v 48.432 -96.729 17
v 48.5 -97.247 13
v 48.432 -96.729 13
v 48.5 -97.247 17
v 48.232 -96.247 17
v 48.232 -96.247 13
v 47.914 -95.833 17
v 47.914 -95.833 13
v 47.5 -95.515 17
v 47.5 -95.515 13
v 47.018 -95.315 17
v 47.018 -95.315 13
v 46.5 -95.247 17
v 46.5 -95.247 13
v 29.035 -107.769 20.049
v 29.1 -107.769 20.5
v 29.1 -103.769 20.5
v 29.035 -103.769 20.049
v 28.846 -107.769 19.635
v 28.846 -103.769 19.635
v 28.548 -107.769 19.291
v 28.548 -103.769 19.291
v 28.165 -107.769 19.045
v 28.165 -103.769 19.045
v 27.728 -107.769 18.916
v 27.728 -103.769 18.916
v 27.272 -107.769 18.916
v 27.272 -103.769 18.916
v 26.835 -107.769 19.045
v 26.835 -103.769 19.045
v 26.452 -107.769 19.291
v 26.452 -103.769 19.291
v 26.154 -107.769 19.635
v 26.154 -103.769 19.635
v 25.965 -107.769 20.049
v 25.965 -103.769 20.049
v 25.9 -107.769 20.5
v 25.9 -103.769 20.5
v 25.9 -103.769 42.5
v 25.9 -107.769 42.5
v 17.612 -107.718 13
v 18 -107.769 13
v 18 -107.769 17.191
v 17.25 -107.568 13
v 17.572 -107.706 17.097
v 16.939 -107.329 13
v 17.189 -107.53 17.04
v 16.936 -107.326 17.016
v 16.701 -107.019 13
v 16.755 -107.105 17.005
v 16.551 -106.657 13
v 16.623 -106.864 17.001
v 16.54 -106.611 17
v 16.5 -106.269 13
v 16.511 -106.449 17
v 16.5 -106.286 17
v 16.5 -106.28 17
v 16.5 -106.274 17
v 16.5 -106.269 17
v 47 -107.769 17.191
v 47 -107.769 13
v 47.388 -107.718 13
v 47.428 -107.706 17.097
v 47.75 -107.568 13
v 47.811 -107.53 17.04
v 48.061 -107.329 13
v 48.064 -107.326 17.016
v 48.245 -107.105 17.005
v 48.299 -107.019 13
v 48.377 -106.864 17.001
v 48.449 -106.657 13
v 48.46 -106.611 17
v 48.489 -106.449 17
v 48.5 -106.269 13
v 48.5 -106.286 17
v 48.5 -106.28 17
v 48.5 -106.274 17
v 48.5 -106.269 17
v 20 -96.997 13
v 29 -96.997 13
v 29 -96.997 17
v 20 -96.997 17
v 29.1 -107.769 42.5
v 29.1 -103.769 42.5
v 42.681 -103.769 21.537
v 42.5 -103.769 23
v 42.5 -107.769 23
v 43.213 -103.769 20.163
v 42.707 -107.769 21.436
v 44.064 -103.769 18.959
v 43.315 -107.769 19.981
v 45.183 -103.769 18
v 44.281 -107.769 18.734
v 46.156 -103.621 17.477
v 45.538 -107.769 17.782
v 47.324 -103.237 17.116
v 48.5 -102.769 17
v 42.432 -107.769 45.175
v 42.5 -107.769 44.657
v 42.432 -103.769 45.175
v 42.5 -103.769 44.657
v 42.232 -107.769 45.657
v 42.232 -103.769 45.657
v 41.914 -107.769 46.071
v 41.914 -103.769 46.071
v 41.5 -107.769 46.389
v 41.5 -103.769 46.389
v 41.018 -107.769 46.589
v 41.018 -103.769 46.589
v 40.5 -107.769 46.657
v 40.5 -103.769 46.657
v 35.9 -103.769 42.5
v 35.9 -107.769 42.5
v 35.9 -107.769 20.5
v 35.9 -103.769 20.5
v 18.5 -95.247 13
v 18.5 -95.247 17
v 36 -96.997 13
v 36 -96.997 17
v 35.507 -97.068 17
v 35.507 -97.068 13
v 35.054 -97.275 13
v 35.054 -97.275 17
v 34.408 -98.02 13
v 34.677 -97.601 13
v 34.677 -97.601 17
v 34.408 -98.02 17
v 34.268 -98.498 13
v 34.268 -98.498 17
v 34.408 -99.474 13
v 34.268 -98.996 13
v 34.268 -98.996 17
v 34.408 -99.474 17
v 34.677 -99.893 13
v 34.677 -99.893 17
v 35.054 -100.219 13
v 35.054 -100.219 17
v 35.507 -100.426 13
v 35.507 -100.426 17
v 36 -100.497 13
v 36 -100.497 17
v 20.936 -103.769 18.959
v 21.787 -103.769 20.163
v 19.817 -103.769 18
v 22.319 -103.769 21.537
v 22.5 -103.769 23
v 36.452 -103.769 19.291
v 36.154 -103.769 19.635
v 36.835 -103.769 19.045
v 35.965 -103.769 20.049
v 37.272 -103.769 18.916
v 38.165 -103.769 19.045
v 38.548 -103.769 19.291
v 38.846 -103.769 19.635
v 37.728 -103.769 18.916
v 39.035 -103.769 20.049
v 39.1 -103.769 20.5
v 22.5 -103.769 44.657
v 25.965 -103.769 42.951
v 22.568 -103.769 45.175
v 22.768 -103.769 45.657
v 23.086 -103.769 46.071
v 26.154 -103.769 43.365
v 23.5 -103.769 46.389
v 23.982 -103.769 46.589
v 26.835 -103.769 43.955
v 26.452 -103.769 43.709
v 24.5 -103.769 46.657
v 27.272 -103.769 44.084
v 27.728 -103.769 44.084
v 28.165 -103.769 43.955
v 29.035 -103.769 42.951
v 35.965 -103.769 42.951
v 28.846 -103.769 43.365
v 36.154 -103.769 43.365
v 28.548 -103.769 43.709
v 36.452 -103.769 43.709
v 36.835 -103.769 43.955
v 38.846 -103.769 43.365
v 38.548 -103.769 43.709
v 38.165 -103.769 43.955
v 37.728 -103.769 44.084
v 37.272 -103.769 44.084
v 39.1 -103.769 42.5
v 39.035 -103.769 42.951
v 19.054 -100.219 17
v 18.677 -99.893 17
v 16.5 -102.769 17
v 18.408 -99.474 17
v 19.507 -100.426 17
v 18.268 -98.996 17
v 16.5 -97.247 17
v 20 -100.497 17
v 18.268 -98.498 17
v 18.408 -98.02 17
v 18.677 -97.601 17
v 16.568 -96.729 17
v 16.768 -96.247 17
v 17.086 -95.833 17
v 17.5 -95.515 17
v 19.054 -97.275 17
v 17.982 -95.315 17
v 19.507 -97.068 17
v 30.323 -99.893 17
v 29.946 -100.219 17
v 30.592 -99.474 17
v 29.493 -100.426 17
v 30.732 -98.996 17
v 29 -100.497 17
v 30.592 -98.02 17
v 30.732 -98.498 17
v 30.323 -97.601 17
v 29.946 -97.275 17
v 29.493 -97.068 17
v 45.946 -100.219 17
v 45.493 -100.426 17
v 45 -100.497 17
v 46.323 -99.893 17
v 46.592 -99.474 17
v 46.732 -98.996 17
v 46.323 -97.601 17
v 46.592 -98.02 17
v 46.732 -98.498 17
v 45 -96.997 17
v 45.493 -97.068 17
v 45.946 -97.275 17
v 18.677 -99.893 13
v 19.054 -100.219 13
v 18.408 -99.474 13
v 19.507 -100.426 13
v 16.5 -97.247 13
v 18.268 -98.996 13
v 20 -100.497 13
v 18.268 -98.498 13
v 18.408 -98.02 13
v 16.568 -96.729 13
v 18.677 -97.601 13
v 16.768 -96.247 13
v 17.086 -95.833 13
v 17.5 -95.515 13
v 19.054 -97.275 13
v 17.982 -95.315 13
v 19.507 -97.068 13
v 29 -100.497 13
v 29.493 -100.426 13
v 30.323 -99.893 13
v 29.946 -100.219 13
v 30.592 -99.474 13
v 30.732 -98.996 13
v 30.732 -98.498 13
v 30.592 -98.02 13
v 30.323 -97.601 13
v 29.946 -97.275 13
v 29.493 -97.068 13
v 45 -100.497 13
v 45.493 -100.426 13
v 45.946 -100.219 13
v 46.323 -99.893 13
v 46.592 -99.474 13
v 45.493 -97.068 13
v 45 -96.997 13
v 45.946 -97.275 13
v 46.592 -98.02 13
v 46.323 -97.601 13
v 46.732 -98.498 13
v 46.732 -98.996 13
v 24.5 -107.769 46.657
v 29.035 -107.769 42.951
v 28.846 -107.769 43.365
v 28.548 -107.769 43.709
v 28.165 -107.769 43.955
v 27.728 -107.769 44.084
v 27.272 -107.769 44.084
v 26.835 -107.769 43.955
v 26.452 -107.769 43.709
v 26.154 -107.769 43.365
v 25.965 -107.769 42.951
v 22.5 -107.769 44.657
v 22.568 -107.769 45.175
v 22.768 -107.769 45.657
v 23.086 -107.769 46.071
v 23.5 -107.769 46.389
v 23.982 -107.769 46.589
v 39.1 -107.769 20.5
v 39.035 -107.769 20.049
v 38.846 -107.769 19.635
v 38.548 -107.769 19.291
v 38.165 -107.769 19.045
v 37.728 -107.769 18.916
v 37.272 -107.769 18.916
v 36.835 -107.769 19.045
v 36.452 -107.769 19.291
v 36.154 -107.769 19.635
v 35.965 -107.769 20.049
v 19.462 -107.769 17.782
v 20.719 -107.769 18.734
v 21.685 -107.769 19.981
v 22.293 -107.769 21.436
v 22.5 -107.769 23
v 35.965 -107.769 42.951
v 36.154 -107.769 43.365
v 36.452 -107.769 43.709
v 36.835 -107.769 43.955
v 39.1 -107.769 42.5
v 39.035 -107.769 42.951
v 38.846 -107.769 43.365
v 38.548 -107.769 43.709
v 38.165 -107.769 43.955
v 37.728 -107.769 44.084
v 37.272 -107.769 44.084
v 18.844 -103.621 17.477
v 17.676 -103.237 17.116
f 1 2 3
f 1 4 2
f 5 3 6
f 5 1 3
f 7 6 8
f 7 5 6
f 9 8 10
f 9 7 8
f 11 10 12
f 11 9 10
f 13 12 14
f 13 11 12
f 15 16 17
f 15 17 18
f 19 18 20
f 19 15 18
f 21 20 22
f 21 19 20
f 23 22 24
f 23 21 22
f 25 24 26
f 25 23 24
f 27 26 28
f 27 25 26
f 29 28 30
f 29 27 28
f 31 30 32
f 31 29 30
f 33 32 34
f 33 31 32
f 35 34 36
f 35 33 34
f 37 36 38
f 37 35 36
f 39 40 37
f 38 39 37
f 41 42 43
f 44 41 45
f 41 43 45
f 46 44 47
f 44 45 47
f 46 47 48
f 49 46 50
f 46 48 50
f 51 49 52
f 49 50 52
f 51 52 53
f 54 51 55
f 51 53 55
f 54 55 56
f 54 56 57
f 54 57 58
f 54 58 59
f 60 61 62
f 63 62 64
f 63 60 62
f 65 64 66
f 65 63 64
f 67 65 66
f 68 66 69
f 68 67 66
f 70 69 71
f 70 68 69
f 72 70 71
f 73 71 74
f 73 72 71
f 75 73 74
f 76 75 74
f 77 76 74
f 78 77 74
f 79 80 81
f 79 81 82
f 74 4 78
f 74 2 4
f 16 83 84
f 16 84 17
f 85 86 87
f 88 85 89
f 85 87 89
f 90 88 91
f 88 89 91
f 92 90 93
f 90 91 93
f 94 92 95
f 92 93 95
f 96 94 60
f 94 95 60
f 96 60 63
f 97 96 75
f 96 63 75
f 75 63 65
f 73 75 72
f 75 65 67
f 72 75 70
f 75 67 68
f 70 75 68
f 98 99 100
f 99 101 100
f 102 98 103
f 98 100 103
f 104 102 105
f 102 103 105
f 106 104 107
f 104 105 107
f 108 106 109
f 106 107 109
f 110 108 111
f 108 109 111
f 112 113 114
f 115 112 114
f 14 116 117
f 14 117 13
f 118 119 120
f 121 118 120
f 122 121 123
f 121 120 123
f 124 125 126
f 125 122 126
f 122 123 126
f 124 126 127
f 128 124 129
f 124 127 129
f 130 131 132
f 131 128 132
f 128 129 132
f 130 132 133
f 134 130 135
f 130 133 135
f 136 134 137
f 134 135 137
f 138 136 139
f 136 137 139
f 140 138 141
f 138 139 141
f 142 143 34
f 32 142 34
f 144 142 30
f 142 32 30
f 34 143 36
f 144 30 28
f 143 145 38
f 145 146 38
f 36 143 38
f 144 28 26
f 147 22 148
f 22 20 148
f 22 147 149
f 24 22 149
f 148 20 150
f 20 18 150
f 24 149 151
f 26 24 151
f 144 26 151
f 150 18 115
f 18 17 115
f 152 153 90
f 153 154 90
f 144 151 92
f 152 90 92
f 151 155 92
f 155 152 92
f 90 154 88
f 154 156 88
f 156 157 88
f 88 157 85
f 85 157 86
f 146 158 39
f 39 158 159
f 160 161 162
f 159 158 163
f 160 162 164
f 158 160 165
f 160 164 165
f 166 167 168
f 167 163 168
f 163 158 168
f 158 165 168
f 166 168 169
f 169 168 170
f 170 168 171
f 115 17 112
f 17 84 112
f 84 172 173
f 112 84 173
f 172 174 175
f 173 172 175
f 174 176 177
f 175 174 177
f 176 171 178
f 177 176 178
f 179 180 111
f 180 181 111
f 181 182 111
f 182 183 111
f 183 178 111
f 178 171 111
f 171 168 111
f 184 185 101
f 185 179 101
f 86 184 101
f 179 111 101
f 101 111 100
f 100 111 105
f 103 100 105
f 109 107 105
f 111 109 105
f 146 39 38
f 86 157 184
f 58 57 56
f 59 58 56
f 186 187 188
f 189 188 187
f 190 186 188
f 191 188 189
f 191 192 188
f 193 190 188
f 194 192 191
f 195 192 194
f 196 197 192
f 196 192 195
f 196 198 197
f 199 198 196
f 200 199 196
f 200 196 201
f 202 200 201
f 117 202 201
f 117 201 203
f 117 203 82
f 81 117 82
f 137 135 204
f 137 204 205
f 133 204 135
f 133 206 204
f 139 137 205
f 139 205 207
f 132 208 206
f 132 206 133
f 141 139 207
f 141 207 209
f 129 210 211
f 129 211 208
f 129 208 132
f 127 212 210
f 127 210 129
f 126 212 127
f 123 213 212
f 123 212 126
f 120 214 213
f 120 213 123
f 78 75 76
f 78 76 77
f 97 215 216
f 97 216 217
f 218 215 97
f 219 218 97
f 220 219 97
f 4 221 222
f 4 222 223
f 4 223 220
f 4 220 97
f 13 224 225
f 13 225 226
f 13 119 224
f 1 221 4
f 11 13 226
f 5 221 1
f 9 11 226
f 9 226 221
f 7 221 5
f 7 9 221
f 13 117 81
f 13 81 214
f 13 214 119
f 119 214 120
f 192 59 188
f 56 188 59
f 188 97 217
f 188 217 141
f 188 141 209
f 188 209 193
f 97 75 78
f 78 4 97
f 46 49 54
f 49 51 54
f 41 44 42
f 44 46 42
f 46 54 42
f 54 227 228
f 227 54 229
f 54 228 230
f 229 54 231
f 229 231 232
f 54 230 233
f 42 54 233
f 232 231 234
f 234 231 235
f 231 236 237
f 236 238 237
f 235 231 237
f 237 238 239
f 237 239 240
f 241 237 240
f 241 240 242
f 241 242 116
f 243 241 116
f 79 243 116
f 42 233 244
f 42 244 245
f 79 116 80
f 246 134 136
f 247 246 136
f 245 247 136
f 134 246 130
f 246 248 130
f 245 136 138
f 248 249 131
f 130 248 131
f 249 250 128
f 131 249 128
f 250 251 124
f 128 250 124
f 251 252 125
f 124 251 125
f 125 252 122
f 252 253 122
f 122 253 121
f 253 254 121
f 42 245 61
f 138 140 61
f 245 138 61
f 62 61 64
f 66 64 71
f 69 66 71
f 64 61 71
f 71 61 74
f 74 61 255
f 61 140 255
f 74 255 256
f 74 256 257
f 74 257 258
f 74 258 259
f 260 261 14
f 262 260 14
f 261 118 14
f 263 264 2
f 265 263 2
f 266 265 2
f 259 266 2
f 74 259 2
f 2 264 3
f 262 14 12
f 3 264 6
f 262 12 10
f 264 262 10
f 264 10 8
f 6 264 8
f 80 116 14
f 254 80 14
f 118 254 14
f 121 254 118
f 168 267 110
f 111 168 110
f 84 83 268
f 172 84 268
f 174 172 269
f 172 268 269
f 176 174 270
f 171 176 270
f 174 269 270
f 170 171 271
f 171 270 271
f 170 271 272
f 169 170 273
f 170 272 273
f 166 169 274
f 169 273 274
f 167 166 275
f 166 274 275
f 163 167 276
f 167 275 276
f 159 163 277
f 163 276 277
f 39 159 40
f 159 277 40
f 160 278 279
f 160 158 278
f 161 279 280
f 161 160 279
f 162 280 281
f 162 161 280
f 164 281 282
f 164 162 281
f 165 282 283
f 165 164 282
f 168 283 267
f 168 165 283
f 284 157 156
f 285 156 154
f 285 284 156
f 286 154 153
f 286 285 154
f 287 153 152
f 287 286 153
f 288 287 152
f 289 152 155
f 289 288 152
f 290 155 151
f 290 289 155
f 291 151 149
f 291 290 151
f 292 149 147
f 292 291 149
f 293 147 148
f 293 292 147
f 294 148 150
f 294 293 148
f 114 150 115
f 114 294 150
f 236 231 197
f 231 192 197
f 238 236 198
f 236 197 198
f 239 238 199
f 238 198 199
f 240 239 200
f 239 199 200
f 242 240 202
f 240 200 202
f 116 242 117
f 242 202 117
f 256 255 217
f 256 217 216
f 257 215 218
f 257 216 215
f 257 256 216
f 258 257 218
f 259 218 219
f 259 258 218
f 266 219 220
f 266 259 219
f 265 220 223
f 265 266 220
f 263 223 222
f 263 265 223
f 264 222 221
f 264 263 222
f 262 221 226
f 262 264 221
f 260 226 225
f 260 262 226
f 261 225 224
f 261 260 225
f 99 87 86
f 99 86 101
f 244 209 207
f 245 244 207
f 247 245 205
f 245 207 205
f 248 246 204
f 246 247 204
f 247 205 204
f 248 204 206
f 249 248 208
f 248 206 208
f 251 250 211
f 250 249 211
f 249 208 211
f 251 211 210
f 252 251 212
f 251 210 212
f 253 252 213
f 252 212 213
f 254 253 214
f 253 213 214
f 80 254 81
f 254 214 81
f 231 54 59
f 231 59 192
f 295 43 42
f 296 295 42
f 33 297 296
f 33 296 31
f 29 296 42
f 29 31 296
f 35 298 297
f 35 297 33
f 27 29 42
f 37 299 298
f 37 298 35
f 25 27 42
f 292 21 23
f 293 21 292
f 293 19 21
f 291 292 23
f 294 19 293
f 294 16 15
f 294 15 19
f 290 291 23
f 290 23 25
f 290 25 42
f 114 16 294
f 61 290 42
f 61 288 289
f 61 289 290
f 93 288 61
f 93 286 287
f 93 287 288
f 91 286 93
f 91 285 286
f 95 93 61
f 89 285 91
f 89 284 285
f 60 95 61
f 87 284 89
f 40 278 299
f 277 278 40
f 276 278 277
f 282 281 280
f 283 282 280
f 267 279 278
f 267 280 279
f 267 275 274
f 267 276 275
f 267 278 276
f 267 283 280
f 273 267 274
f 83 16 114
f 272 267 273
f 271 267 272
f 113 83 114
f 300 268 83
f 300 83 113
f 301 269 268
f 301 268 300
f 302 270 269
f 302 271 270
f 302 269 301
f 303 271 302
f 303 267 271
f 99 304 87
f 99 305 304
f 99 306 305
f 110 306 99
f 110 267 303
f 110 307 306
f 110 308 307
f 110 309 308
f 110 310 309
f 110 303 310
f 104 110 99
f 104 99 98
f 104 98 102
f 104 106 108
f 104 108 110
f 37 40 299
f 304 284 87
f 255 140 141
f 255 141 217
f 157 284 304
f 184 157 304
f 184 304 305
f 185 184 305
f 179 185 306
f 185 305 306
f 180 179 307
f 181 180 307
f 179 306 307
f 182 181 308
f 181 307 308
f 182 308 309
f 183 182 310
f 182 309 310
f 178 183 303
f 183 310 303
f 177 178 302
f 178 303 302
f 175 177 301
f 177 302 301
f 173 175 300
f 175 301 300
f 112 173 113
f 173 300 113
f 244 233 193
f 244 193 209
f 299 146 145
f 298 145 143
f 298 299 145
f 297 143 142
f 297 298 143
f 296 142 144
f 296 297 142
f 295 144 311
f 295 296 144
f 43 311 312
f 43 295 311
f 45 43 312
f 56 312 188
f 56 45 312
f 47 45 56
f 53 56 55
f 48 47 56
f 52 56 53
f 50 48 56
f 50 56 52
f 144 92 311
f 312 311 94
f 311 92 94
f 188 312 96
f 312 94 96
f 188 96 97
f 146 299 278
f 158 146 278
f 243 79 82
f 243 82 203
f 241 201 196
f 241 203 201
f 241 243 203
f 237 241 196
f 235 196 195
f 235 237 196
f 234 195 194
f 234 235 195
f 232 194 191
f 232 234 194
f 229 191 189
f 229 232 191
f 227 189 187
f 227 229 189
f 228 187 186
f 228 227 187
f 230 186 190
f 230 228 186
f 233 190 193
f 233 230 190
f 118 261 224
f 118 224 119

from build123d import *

# Parameters (mm, degrees)
EXTRUDE_1_DEPTH           = 3
SKETCH_7_R                = 2.25
CUT_EXTRUDE_2_DEPTH       = 143.955430949
SKETCH_8_R                = 8
CUT_EXTRUDE_3_DEPTH       = 143.955430949
CUT_EXTRUDE_4_DEPTH       = 3
CUT_EXTRUDE_5_DEPTH       = 3
CUT_EXTRUDE_8_DEPTH       = 3
SKETCH_12_R               = 1.7
CUT_EXTRUDE_9_DEPTH       = 3
SKETCH_13_R               = 1.7
CUT_EXTRUDE_11_DEPTH      = 3
CUT_EXTRUDE_12_DEPTH      = 143.955430949
FILLET_1_R                = 2
FILLET_2_R                = 2
CUT_EXTRUDE_13_DEPTH      = 143.955430949
CUT_EXTRUDE_14_DEPTH      = 143.955430949
CUT_EXTRUDE_15_DEPTH      = 143.955430949
CUT_EXTRUDE_16_DEPTH      = 143.955430949
EXTRUDE_2_DEPTH           = 4
EXTRUDE_2_2_DEPTH         = 4
EXTRUDE_4_DEPTH           = 4
EXTRUDE_5_DEPTH           = 35
SKETCH_25_W               = 6
SKETCH_25_H               = 31
CUT_EXTRUDE_17_DEPTH      = 5
FILLET_3_R                = 6
FILLET_4_R                = 6
FILLET_5_R                = 1.5
FILLET_6_R                = 1.5
CUT_EXTRUDE_18_DEPTH      = 5
CUT_EXTRUDE_19_DEPTH      = 15
CUT_EXTRUDE_19_DEPTH_BACK = 95
SKETCH_27_W               = 31
SKETCH_27_H               = 1
FILLET_8_R                = 1
FILLET_9_R                = 1
FILLET_10_R               = 3
SKETCH_28_W               = 85
SKETCH_28_H               = 10.343066278
CUT_EXTRUDE_20_DEPTH      = 5
FILLET_12_R               = 3
FILLET_13_R               = 3
EXTRUDE_7_DEPTH           = 4
FILLET_14_R               = 2
FILLET_15_R               = 2
SKETCH_33_W               = 46.51678315
SKETCH_33_H               = 37.006685261
CUT_EXTRUDE_22_DEPTH      = 40
SKETCH_34_W               = 20
SKETCH_34_H               = 12
EXTRUDE_8_DEPTH           = 4
CUT_EXTRUDE_23_DEPTH      = 10
FILLET_17_R               = 2


# Read off the part's stored shape, not the designer's step: 切除-拉伸21
# Some blends are built 0.0001 mm under size
with BuildPart() as part:
    # 草图1 → 凸台-拉伸1 (new body)
    # profile 1 of 14: a face of its own
    with BuildSketch(Plane.XY):
        with BuildLine():
            Line((60, 106.603296002), (35.889163634, 121.664519159))
            Line((35.889163634, 121.664519159), (-35.889163634, 121.664519159))
            Line((-35.889163634, 121.664519159), (-60, 106.603296002))
            Line((-60, 106.603296002), (-60, 94.801892265))
            Line((-60, 94.801892265), (-45, 94.801892265))
            ThreePointArc((-45, 94.801892265), (-43.762563133, 94.289329132), (-43.25, 93.051892265))
            Line((-43.25, 93.051892265), (-37.75, 93.051892265))
            ThreePointArc((-37.75, 93.051892265), (-37.237436867, 94.289329132), (-36, 94.801892265))
            Line((-36, 94.801892265), (-21, 94.801892265))
            ThreePointArc((-21, 94.801892265), (-19.762563133, 94.289329132), (-19.25, 93.051892265))
            Line((-19.25, 93.051892265), (19.25, 93.051892265))
            ThreePointArc((19.25, 93.051892265), (19.762563133, 94.289329132), (21, 94.801892265))
            Line((21, 94.801892265), (36, 94.801892265))
            ThreePointArc((36, 94.801892265), (37.237436867, 94.289329132), (37.75, 93.051892265))
            Line((37.75, 93.051892265), (43.25, 93.051892265))
            ThreePointArc((43.25, 93.051892265), (43.762563133, 94.289329132), (45, 94.801892265))
            Line((45, 94.801892265), (60, 94.801892265))
            Line((60, 94.801892265), (60, 106.603296002))
        make_face()
    # profile 2 of 14: a face of its own
    with BuildSketch(Plane.XY):
        with BuildLine():
            Line((66.901694095, 102.292041372), (60, 106.603296002))
            Line((60, 106.603296002), (60, 94.801892265))
            ThreePointArc((60, 94.801892265), (61.237436867, 94.289329132), (61.75, 93.051892265))
            Line((61.75, 93.051892265), (66.901694095, 93.051892265))
            Line((66.901694095, 93.051892265), (66.901694095, 102.292041372))
        make_face()
    # profile 3 of 14: a face of its own
    with BuildSketch(Plane.XY):
        with BuildLine():
            Line((-60, 94.801892265), (-60, 106.603296002))
            Line((-60, 106.603296002), (-66.901694095, 102.292041372))
            Line((-66.901694095, 102.292041372), (-66.901694095, 93.051892265))
            Line((-66.901694095, 93.051892265), (-61.75, 93.051892265))
            ThreePointArc((-61.75, 93.051892265), (-61.237436867, 94.289329132), (-60, 94.801892265))
        make_face()
    # profile 4 of 14: a face of its own
    with BuildSketch(Plane.XY):
        with BuildLine():
            Line((66.901694095, 63.051892265), (66.901694095, 93.051892265))
            Line((66.901694095, 93.051892265), (61.75, 93.051892265))
            ThreePointArc((61.75, 93.051892265), (61.237436867, 91.814455398), (60, 91.301892265))
            Line((60, 91.301892265), (60, 64.801892265))
            ThreePointArc((60, 64.801892265), (61.237436867, 64.289329132), (61.75, 63.051892265))
            Line((61.75, 63.051892265), (66.901694095, 63.051892265))
        make_face()
    # profile 5 of 14: a face of its own
    with BuildSketch(Plane.XY):
        with BuildLine():
            Line((-61.75, 93.051892265), (-66.901694095, 93.051892265))
            Line((-66.901694095, 93.051892265), (-66.901694095, 63.051892265))
            Line((-66.901694095, 63.051892265), (-61.75, 63.051892265))
            ThreePointArc((-61.75, 63.051892265), (-61.237436867, 64.289329132), (-60, 64.801892265))
            Line((-60, 64.801892265), (-60, 91.301892265))
            ThreePointArc((-60, 91.301892265), (-61.237436867, 91.814455398), (-61.75, 93.051892265))
        make_face()
    # profile 6 of 14: a face of its own
    with BuildSketch(Plane.XY):
        with BuildLine():
            Line((66.901694095, 52.870133869), (66.901694095, 63.051892265))
            Line((66.901694095, 63.051892265), (61.75, 63.051892265))
            ThreePointArc((61.75, 63.051892265), (61.237436867, 61.814455398), (60, 61.301892265))
            Line((60, 61.301892265), (60, 31.261343001))
            Line((60, 31.261343001), (75, 31.261343001))
            Line((75, 31.261343001), (75, 40.933889795))
            ThreePointArc((75, 40.933889795), (69.117351927, 45.658052319), (66.901694095, 52.870133869))
        make_face()
    # profile 7 of 14: a face of its own
    with BuildSketch(Plane.XY):
        with BuildLine():
            Line((60, 64.801892265), (60, 91.301892265))
            Line((60, 91.301892265), (45, 91.301892265))
            ThreePointArc((45, 91.301892265), (43.762563133, 91.814455398), (43.25, 93.051892265))
            Line((43.25, 93.051892265), (37.75, 93.051892265))
            ThreePointArc((37.75, 93.051892265), (37.237436867, 91.814455398), (36, 91.301892265))
            Line((36, 91.301892265), (21, 91.301892265))
            ThreePointArc((21, 91.301892265), (19.762563133, 91.814455398), (19.25, 93.051892265))
            Line((19.25, 93.051892265), (-19.25, 93.051892265))
            ThreePointArc((-19.25, 93.051892265), (-19.762563133, 91.814455398), (-21, 91.301892265))
            Line((-21, 91.301892265), (-36, 91.301892265))
            ThreePointArc((-36, 91.301892265), (-37.237436867, 91.814455398), (-37.75, 93.051892265))
            Line((-37.75, 93.051892265), (-43.25, 93.051892265))
            ThreePointArc((-43.25, 93.051892265), (-43.762563133, 91.814455398), (-45, 91.301892265))
            Line((-45, 91.301892265), (-60, 91.301892265))
            Line((-60, 91.301892265), (-60, 64.801892265))
            Line((-60, 64.801892265), (-45, 64.801892265))
            ThreePointArc((-45, 64.801892265), (-43.762563133, 64.289329132), (-43.25, 63.051892265))
            Line((-43.25, 63.051892265), (-37.75, 63.051892265))
            ThreePointArc((-37.75, 63.051892265), (-37.237436867, 64.289329132), (-36, 64.801892265))
            Line((-36, 64.801892265), (-21, 64.801892265))
            ThreePointArc((-21, 64.801892265), (-19.762563133, 64.289329132), (-19.25, 63.051892265))
            Line((-19.25, 63.051892265), (19.25, 63.051892265))
            ThreePointArc((19.25, 63.051892265), (19.762563133, 64.289329132), (21, 64.801892265))
            Line((21, 64.801892265), (36, 64.801892265))
            ThreePointArc((36, 64.801892265), (37.237436867, 64.289329132), (37.75, 63.051892265))
            Line((37.75, 63.051892265), (43.25, 63.051892265))
            ThreePointArc((43.25, 63.051892265), (43.762563133, 64.289329132), (45, 64.801892265))
            Line((45, 64.801892265), (60, 64.801892265))
        make_face()
    # profile 8 of 14: a face of its own
    with BuildSketch(Plane.XY):
        with BuildLine():
            Line((-61.75, 63.051892265), (-66.901694095, 63.051892265))
            Line((-66.901694095, 63.051892265), (-66.901694095, 52.870133869))
            ThreePointArc((-66.901694095, 52.870133869), (-69.117351927, 45.658052319), (-75, 40.933889795))
            Line((-75, 40.933889795), (-75, 31.261343001))
            Line((-75, 31.261343001), (-60, 31.261343001))
            Line((-60, 31.261343001), (-60, 61.301892265))
            ThreePointArc((-60, 61.301892265), (-61.237436867, 61.814455398), (-61.75, 63.051892265))
        make_face()
    # profile 9 of 14: a face of its own
    with BuildSketch(Plane.XY):
        with BuildLine():
            Line((60, 31.261343001), (60, 61.301892265))
            Line((60, 61.301892265), (45, 61.301892265))
            ThreePointArc((45, 61.301892265), (43.762563133, 61.814455398), (43.25, 63.051892265))
            Line((43.25, 63.051892265), (37.75, 63.051892265))
            ThreePointArc((37.75, 63.051892265), (37.237436867, 61.814455398), (36, 61.301892265))
            Line((36, 61.301892265), (21, 61.301892265))
            ThreePointArc((21, 61.301892265), (19.762563133, 61.814455398), (19.25, 63.051892265))
            Line((19.25, 63.051892265), (-19.25, 63.051892265))
            ThreePointArc((-19.25, 63.051892265), (-19.762563133, 61.814455398), (-21, 61.301892265))
            Line((-21, 61.301892265), (-36, 61.301892265))
            ThreePointArc((-36, 61.301892265), (-37.237436867, 61.814455398), (-37.75, 63.051892265))
            Line((-37.75, 63.051892265), (-43.25, 63.051892265))
            ThreePointArc((-43.25, 63.051892265), (-43.762563133, 61.814455398), (-45, 61.301892265))
            Line((-45, 61.301892265), (-60, 61.301892265))
            Line((-60, 61.301892265), (-60, 31.261343001))
            Line((-60, 31.261343001), (60, 31.261343001))
        make_face()
    # profile 10 of 14: a face of its own
    with BuildSketch(Plane.XY):
        with BuildLine():
            Line((60, -58.312864289), (60, 23.940028391))
            Line((60, 23.940028391), (-60, 23.940028391))
            Line((-60, 23.940028391), (-60, -58.312864289))
            Line((-60, -58.312864289), (-45, -58.312864289))
            ThreePointArc((-45, -58.312864289), (-43.25, -60.062864289), (-45, -61.812864289))
            Line((-45, -61.812864289), (-60, -61.812864289))
            Line((-60, -61.812864289), (-60, -88.312864289))
            Line((-60, -88.312864289), (-45, -88.312864289))
            ThreePointArc((-45, -88.312864289), (-43.25, -90.062864289), (-45, -91.812864289))
            Line((-45, -91.812864289), (-60, -91.812864289))
            Line((-60, -91.812864289), (-60, -111.849967256))
            Line((-60, -111.849967256), (-38.845469114, -105.590576733))
            ThreePointArc((-38.845469114, -105.590576733), (-36.037784492, -104.975210108), (-33.17088573, -104.768665882))
            Line((-33.17088573, -104.768665882), (33.17088573, -104.768665882))
            ThreePointArc((33.17088573, -104.768665882), (36.037784492, -104.975210108), (38.845469114, -105.590576733))
            Line((38.845469114, -105.590576733), (60, -111.849967256))
            Line((60, -111.849967256), (60, -91.812864289))
            Line((60, -91.812864289), (45, -91.812864289))
            ThreePointArc((45, -91.812864289), (43.762563133, -91.300301156), (43.25, -90.062864289))
            ThreePointArc((43.25, -90.062864289), (43.762563133, -88.825427422), (45, -88.312864289))
            Line((45, -88.312864289), (60, -88.312864289))
            Line((60, -88.312864289), (60, -61.812864289))
            Line((60, -61.812864289), (45, -61.812864289))
            ThreePointArc((45, -61.812864289), (43.762563133, -61.300301156), (43.25, -60.062864289))
            ThreePointArc((43.25, -60.062864289), (43.762563133, -58.825427422), (45, -58.312864289))
            Line((45, -58.312864289), (60, -58.312864289))
        make_face()
        with BuildLine():
            ThreePointArc((-21, -88.312864289), (-19.762563133, -88.825427422), (-19.25, -90.062864289))
            ThreePointArc((-19.25, -90.062864289), (-19.762563133, -91.300301156), (-21, -91.812864289))
            Line((-21, -91.812864289), (-36, -91.812864289))
            ThreePointArc((-36, -91.812864289), (-37.75, -90.062864289), (-36, -88.312864289))
            Line((-36, -88.312864289), (-21, -88.312864289))
        make_face(mode=Mode.SUBTRACT)
        with BuildLine():
            ThreePointArc((-21, -58.312864289), (-19.762563133, -58.825427422), (-19.25, -60.062864289))
            ThreePointArc((-19.25, -60.062864289), (-19.762563133, -61.300301156), (-21, -61.812864289))
            Line((-21, -61.812864289), (-36, -61.812864289))
            ThreePointArc((-36, -61.812864289), (-37.75, -60.062864289), (-36, -58.312864289))
            Line((-36, -58.312864289), (-21, -58.312864289))
        make_face(mode=Mode.SUBTRACT)
        with BuildLine():
            ThreePointArc((36, -88.312864289), (37.237436867, -88.825427422), (37.75, -90.062864289))
            ThreePointArc((37.75, -90.062864289), (37.237436867, -91.300301156), (36, -91.812864289))
            Line((36, -91.812864289), (21, -91.812864289))
            ThreePointArc((21, -91.812864289), (19.762563133, -91.300301156), (19.25, -90.062864289))
            ThreePointArc((19.25, -90.062864289), (19.762563133, -88.825427422), (21, -88.312864289))
            Line((21, -88.312864289), (36, -88.312864289))
        make_face(mode=Mode.SUBTRACT)
        with BuildLine():
            ThreePointArc((36, -58.312864289), (37.237436867, -58.825427422), (37.75, -60.062864289))
            ThreePointArc((37.75, -60.062864289), (37.237436867, -61.300301156), (36, -61.812864289))
            Line((36, -61.812864289), (21, -61.812864289))
            ThreePointArc((21, -61.812864289), (19.762563133, -61.300301156), (19.25, -60.062864289))
            ThreePointArc((19.25, -60.062864289), (19.762563133, -58.825427422), (21, -58.312864289))
            Line((21, -58.312864289), (36, -58.312864289))
        make_face(mode=Mode.SUBTRACT)
    # profile 11 of 14: a face of its own
    with BuildSketch(Plane.XY):
        with BuildLine():
            Line((75, 23.940028391), (60, 23.940028391))
            Line((60, 23.940028391), (60, -58.312864289))
            ThreePointArc((60, -58.312864289), (61.237436867, -58.825427422), (61.75, -60.062864289))
            Line((61.75, -60.062864289), (67.402721334, -60.062864289))
            add(Edge.make_bspline(
                [(75, 10.562559835), (72.695878257, 1.907314233), (70.339582535, -13.372796253), (67.818206704, -36.939032951), (67.208860388, -51.77269444), (67.402721334, -60.062864289)],
                knots=[0, 0, 0, 0, 0.235246678, 0.40629419, 0.624108181, 0.624108181, 0.624108181, 0.624108181], degree=3))
            Line((75, 10.562559835), (75, 23.940028391))
        make_face()
    # profile 12 of 14: a face of its own
    with BuildSketch(Plane.XY):
        with BuildLine():
            Line((-60, -58.312864289), (-60, 23.940028391))
            Line((-60, 23.940028391), (-75, 23.940028391))
            Line((-75, 23.940028391), (-75, 10.562559835))
            add(Edge.make_bspline(
                [(-75, 10.562559835), (-72.695878257, 1.907314233), (-70.339582535, -13.372796253), (-67.818206704, -36.939032951), (-67.208860388, -51.77269444), (-67.402721334, -60.062864289)],
                knots=[0, 0, 0, 0, 0.235246678, 0.40629419, 0.624108181, 0.624108181, 0.624108181, 0.624108181], degree=3))
            add(Edge.make_bspline(
                [(-67.402721334, -60.062864289), (-67.560325872, -66.802583754), (-68.323504015, -76.843670093), (-70.154131955, -86.778530076), (-70.533712858, -90.062864289)],
                knots=[0.624108181, 0.624108181, 0.624108181, 0.624108181, 0.801186001, 0.888408652, 0.888408652, 0.888408652, 0.888408652], degree=3))
            add(Edge.make_bspline(
                [(-70.533712858, -90.062864289), (-71.019342956, -94.264792095), (-71.137422935, -98.476048206), (-70.1742624, -102.732794059)],
                knots=[0.888408652, 0.888408652, 0.888408652, 0.888408652, 1, 1, 1, 1], degree=3))
            Line((-70.1742624, -102.732794059), (-66.460817635, -113.761651372))
            Line((-66.460817635, -113.761651372), (-60, -111.849967256))
            Line((-60, -111.849967256), (-60, -91.812864289))
            ThreePointArc((-60, -91.812864289), (-61.75, -90.062864289), (-60, -88.312864289))
            Line((-60, -88.312864289), (-60, -61.812864289))
            ThreePointArc((-60, -61.812864289), (-61.75, -60.062864289), (-60, -58.312864289))
        make_face()
    # profile 13 of 14: a face of its own
    with BuildSketch(Plane.XY):
        with BuildLine():
            Line((67.402721334, -60.062864289), (61.75, -60.062864289))
            ThreePointArc((61.75, -60.062864289), (61.237436867, -61.300301156), (60, -61.812864289))
            Line((60, -61.812864289), (60, -88.312864289))
            ThreePointArc((60, -88.312864289), (61.237436867, -88.825427422), (61.75, -90.062864289))
            Line((61.75, -90.062864289), (70.533712858, -90.062864289))
            add(Edge.make_bspline(
                [(67.402721334, -60.062864289), (67.560325872, -66.802583754), (68.323504015, -76.843670093), (70.154131955, -86.778530076), (70.533712858, -90.062864289)],
                knots=[0.624108181, 0.624108181, 0.624108181, 0.624108181, 0.801186001, 0.888408652, 0.888408652, 0.888408652, 0.888408652], degree=3))
        make_face()
    # profile 14 of 14: a face of its own
    with BuildSketch(Plane.XY):
        with BuildLine():
            add(Edge.make_bspline(
                [(70.533712858, -90.062864289), (71.019342956, -94.264792095), (71.137422935, -98.476048206), (70.1742624, -102.732794059)],
                knots=[0.888408652, 0.888408652, 0.888408652, 0.888408652, 1, 1, 1, 1], degree=3))
            Line((70.533712858, -90.062864289), (61.75, -90.062864289))
            ThreePointArc((61.75, -90.062864289), (61.237436867, -91.300301156), (60, -91.812864289))
            Line((60, -91.812864289), (60, -111.849967256))
            Line((60, -111.849967256), (66.460817635, -113.761651372))
            Line((66.460817635, -113.761651372), (70.1742624, -102.732794059))
        make_face()
    extrude(amount=EXTRUDE_1_DEPTH)

    # 草图7 → 切除-拉伸2 (cut, through all)
    with BuildSketch(Plane(origin=(0, 0, 0), x_dir=(-1, 0, 0), z_dir=(0, 0, -1))):
        with Locations((-21, 41.261343001)):
            Circle(SKETCH_7_R)
        with Locations((21, 41.261343001)):
            Circle(SKETCH_7_R)
        with Locations((-21, 13.940028391)):
            Circle(SKETCH_7_R)
        with Locations((21, 13.940028391)):
            Circle(SKETCH_7_R)
    extrude(amount=-CUT_EXTRUDE_2_DEPTH, mode=Mode.SUBTRACT)

    # 草图8 → 切除-拉伸3 (cut, through all)
    with BuildSketch(Plane.XY.offset(3)):
        with BuildLine():
            Line((-12.621438714, -0.378557945), (-33.409010345, 20.409013685))
            ThreePointArc((-33.409010345, 20.409013685), (-36.590999434, 20.409013643), (-36.590999309, 17.227024553))
            Line((-36.590999309, 17.227024553), (-15.803426586, -3.560545984))
            ThreePointArc((-15.803426586, -3.560545984), (-12.621438673, -3.560545859), (-12.621438714, -0.378557945))
        make_face()
        with BuildLine():
            Line((33.410462056, 20.410458798), (12.572988319, -0.427010824))
            ThreePointArc((12.572988319, -0.427010824), (12.644570441, -3.584764993), (15.803045702, -3.56090242))
            Line((15.803045702, -3.56090242), (34.999999982, 15.636052774))
            Line((34.999999982, 15.636052774), (36.588086952, 17.224139819))
            ThreePointArc((36.588086952, 17.224139819), (36.592433993, 20.406111757), (33.410462056, 20.410458798))
        make_face()
        with BuildLine():
            Line((-15.803784812, -28.80377835), (-36.591002186, -49.590991619))
            ThreePointArc((-36.591002186, -49.590991619), (-36.591002403, -52.772972232), (-33.40902179, -52.772972254))
            Line((-33.40902179, -52.772972254), (-12.573723916, -31.937673388))
            ThreePointArc((-12.573723916, -31.937673388), (-12.64530628, -28.779915954), (-15.803784812, -28.80377835))
        make_face()
        with BuildLine():
            Line((36.590992666, -49.590989326), (15.803414627, -28.803411286))
            ThreePointArc((15.803414627, -28.803411286), (12.654338964, -28.769774302), (12.55344336, -31.917412949))
            Line((12.55344336, -31.917412949), (33.409007381, -52.772974779))
            ThreePointArc((33.409007381, -52.772974779), (36.590992708, -52.772974653), (36.590992666, -49.590989326))
        make_face()
        with Locations((-0.000368782, -16.182341354)):
            Circle(SKETCH_8_R)
    extrude(amount=-CUT_EXTRUDE_3_DEPTH, mode=Mode.SUBTRACT)

    # 草图9 → 切除-拉伸4 (cut)
    with BuildSketch(Plane.XY.offset(3)):
        with BuildLine():
            Line((55, -100.49704609), (20, -100.49704609))
            ThreePointArc((20, -100.49704609), (18.25, -98.74704609), (20, -96.99704609))
            Line((20, -96.99704609), (55, -96.99704609))
            ThreePointArc((55, -96.99704609), (56.75, -98.74704609), (55, -100.49704609))
        make_face()
        with BuildLine():
            Line((-55, -96.99704609), (-20, -96.99704609))
            ThreePointArc((-20, -96.99704609), (-18.25, -98.74704609), (-20, -100.49704609))
            Line((-20, -100.49704609), (-55, -100.49704609))
            ThreePointArc((-55, -100.49704609), (-56.75, -98.74704609), (-55, -96.99704609))
        make_face()
    extrude(amount=-CUT_EXTRUDE_4_DEPTH, mode=Mode.SUBTRACT)

    # 草图10 → 切除-拉伸5 (cut)
    with BuildSketch(Plane.XY.offset(3)):
        with BuildLine():
            Line((12.5, -80.062864289), (-12.5, -80.062864289))
            ThreePointArc((-12.5, -80.062864289), (-17.5, -75.062864289), (-12.5, -70.062864289))
            Line((-12.5, -70.062864289), (12.5, -70.062864289))
            ThreePointArc((12.5, -70.062864289), (17.5, -75.062864289), (12.5, -80.062864289))
        make_face()
    extrude(amount=-CUT_EXTRUDE_5_DEPTH, mode=Mode.SUBTRACT)

    # 草图11 → 切除-拉伸8 (cut)
    with BuildSketch(Plane.XY.offset(3)):
        with BuildLine():
            Line((15, 73.051892265), (-15, 73.051892265))
            ThreePointArc((-15, 73.051892265), (-20, 78.051892265), (-15, 83.051892265))
            Line((-15, 83.051892265), (15, 83.051892265))
            ThreePointArc((15, 83.051892265), (20, 78.051892265), (15, 73.051892265))
        make_face()
    extrude(amount=-CUT_EXTRUDE_8_DEPTH, mode=Mode.SUBTRACT)

    # 草图12 → 切除-拉伸9 (cut)
    with BuildSketch(Plane.XY.offset(3)):
        with Locations((0, 114.371786435)):
            Circle(SKETCH_12_R)
        with Locations((0, 98.371786435)):
            Circle(SKETCH_12_R)
        with Locations((8, 106.371786435)):
            Circle(SKETCH_12_R)
        with Locations((-8, 106.371786435)):
            Circle(SKETCH_12_R)
    extrude(amount=-CUT_EXTRUDE_9_DEPTH, mode=Mode.SUBTRACT)

    # 草图13 → 切除-拉伸11 (cut)
    with BuildSketch(Plane.XY.offset(3)):
        with Locations((0, -84.415765086)):
            Circle(SKETCH_13_R)
        with Locations((8, -92.415765086)):
            Circle(SKETCH_13_R)
        with Locations((0, -100.415765086)):
            Circle(SKETCH_13_R)
        with Locations((-8, -92.415765086)):
            Circle(SKETCH_13_R)
    extrude(amount=-CUT_EXTRUDE_11_DEPTH, mode=Mode.SUBTRACT)

    # 草图14 → 切除-拉伸12 (cut, through all)
    with BuildSketch(Plane.XY.offset(3)):
        with BuildLine():
            Line((-55.475501567, 8.919687236), (-55.475501567, -46.080312764))
            ThreePointArc((-55.475501567, -46.080312764), (-57.225501567, -47.830312764), (-58.975501567, -46.080312764))
            Line((-58.975501567, -46.080312764), (-58.975501567, 8.919687236))
            ThreePointArc((-58.975501567, 8.919687236), (-57.225501567, 10.669687236), (-55.475501567, 8.919687236))
        make_face()
        with BuildLine():
            Line((58.975501567, 8.919687236), (58.975501567, -46.080312764))
            ThreePointArc((58.975501567, -46.080312764), (57.225501567, -47.830312764), (55.475501567, -46.080312764))
            Line((55.475501567, -46.080312764), (55.475501567, 8.919687236))
            ThreePointArc((55.475501567, 8.919687236), (57.225501567, 10.669687236), (58.975501567, 8.919687236))
        make_face()
    extrude(amount=-CUT_EXTRUDE_12_DEPTH, mode=Mode.SUBTRACT)

    # 圆角1
    fillet_1_edges = [part.edges().sort_by_distance(p)[0] for p in [
        (75, 31.261343001, 1.5),
        (-75, 31.261343001, 1.5),
    ]]
    fillet(fillet_1_edges, radius=FILLET_1_R)

    # 圆角2
    fillet_2_edges = [part.edges().sort_by_distance(p)[0] for p in [
        (-75, 23.940028391, 1.5),
        (75, 23.940028391, 1.5),
    ]]
    fillet(fillet_2_edges, radius=FILLET_2_R)

    # 草图15 → 切除-拉伸13 (cut, through all)
    with BuildSketch(Plane(origin=(0, 0, 0), x_dir=(-1, 0, 0), z_dir=(0, 0, -1))):
        with BuildLine():
            Line((-61.184216401, 102.403501276), (-34.774762862, 118.900592756))
            ThreePointArc((-34.774762862, 118.900592756), (-32.70788159, 118.423097411), (-33.185376934, 116.356216138))
            Line((-33.185376934, 116.356216138), (-59.594830473, 99.859124658))
            ThreePointArc((-59.594830473, 99.859124658), (-61.661711746, 100.336620003), (-61.184216401, 102.403501276))
        make_face()
        with BuildLine():
            Line((59.594830473, 99.859124658), (33.185376934, 116.356216138))
            ThreePointArc((33.185376934, 116.356216138), (32.70788159, 118.423097411), (34.774762862, 118.900592756))
            Line((34.774762862, 118.900592756), (61.184216401, 102.403501276))
            ThreePointArc((61.184216401, 102.403501276), (61.661711746, 100.336620003), (59.594830473, 99.859124658))
        make_face()
    extrude(amount=-CUT_EXTRUDE_13_DEPTH, mode=Mode.SUBTRACT)

    # 草图16 → 切除-拉伸14 (cut, through all)
    with BuildSketch(Plane(origin=(0, 0, 0), x_dir=(-1, 0, 0), z_dir=(0, 0, -1))):
        with BuildLine():
            Line((-61.516979467, 42.761343001), (-32.056291893, 42.761343001))
            ThreePointArc((-32.056291893, 42.761343001), (-30.556291893, 41.261343001), (-32.056291893, 39.761343001))
            Line((-32.056291893, 39.761343001), (-61.516979467, 39.761343001))
            ThreePointArc((-61.516979467, 39.761343001), (-63.016979467, 41.261343001), (-61.516979467, 42.761343001))
        make_face()
        with BuildLine():
            Line((61.516979467, 39.761343001), (32.056291893, 39.761343001))
            ThreePointArc((32.056291893, 39.761343001), (30.556291893, 41.261343001), (32.056291893, 42.761343001))
            Line((32.056291893, 42.761343001), (61.516979467, 42.761343001))
            ThreePointArc((61.516979467, 42.761343001), (63.016979467, 41.261343001), (61.516979467, 39.761343001))
        make_face()
    extrude(amount=-CUT_EXTRUDE_14_DEPTH, mode=Mode.SUBTRACT)

    # 草图17 → 切除-拉伸15 (cut, through all)
    with BuildSketch(Plane(origin=(0, 0, 0), x_dir=(-1, 0, 0), z_dir=(0, 0, -1))):
        Polygon((-28.645414283, -8.118433382), (-34.644957411, -20.11751964), (-34.644957411, -29.946558382), (-37.580904049, -29.946558382), (-37.580904049, -20.11751964), (-43.580447177, -8.118433382), (-40.64450054, -8.118433382), (-36.176755657, -17.43687271), (-36.049105803, -17.43687271), (-31.58136092, -8.118433382), align=None)
    extrude(amount=-CUT_EXTRUDE_15_DEPTH, mode=Mode.SUBTRACT)

    # 草图18 → 切除-拉伸16 (cut, through all)
    with BuildSketch(Plane(origin=(0, 0, 0), x_dir=(-1, 0, 0), z_dir=(0, 0, -1))):
        Polygon((46.06697123, -29.087529791), (43.131024593, -29.087529791), (43.131024593, -18.875541487), (35.854982926, -18.875541487), (35.854982926, -29.087529791), (32.919036289, -29.087529791), (32.919036289, -7.259404791), (35.854982926, -7.259404791), (35.854982926, -16.450194265), (43.131024593, -16.450194265), (43.131024593, -7.259404791), (46.06697123, -7.259404791), align=None)
    extrude(amount=-CUT_EXTRUDE_16_DEPTH, mode=Mode.SUBTRACT)


with BuildPart() as body_2:
    # 草图19 → 凸台-拉伸2 (new body)
    with BuildSketch(Plane.XY.offset(13)):
        Polygon((16.5, -101.24704609), (16.5, -96.24704609), (48.5, -96.24704609), (48.5, -101.24704609), (48.5, -104.768665882), (16.5, -104.768665882), align=None)
        with BuildLine():
            Line((20, -100.49704609), (45, -100.49704609))
            ThreePointArc((45, -100.49704609), (46.75, -98.74704609), (45, -96.99704609))
            Line((45, -96.99704609), (20, -96.99704609))
            ThreePointArc((20, -96.99704609), (18.25, -98.74704609), (20, -100.49704609))
        make_face(mode=Mode.SUBTRACT)
    extrude(amount=EXTRUDE_2_DEPTH)



with BuildPart() as body_3:
    # 草图19 → Extrude 2 2 (new body)
    with BuildSketch(Plane.XY.offset(13)):
        Polygon((-16.5, -101.24704609), (-16.5, -104.768665882), (-48.5, -104.768665882), (-48.5, -101.24704609), (-48.5, -96.24704609), (-16.5, -96.24704609), align=None)
        with BuildLine():
            Line((-45, -96.99704609), (-20, -96.99704609))
            ThreePointArc((-20, -96.99704609), (-18.25, -98.74704609), (-20, -100.49704609))
            Line((-20, -100.49704609), (-45, -100.49704609))
            ThreePointArc((-45, -100.49704609), (-46.75, -98.74704609), (-45, -96.99704609))
        make_face(mode=Mode.SUBTRACT)
    extrude(amount=EXTRUDE_2_2_DEPTH)


with BuildPart() as body_2_1:
    add(body_2.part)

    add(body_3.part)  # 凸台-拉伸4 merges body 3
    # 草图21 → 凸台-拉伸4 (add)
    with BuildSketch(Plane.XY.offset(17)):
        with BuildLine():
            Line((-36, -96.99704609), (-29, -96.99704609))
            ThreePointArc((-29, -96.99704609), (-30.75, -98.74704609), (-29, -100.49704609))
            Line((-29, -100.49704609), (-36, -100.49704609))
            ThreePointArc((-36, -100.49704609), (-34.25, -98.74704609), (-36, -96.99704609))
        make_face()
        with BuildLine():
            Line((36, -100.49704609), (29, -100.49704609))
            ThreePointArc((29, -100.49704609), (30.75, -98.74704609), (29, -96.99704609))
            Line((29, -96.99704609), (36, -96.99704609))
            ThreePointArc((36, -96.99704609), (34.25, -98.74704609), (36, -100.49704609))
        make_face()
    extrude(amount=-EXTRUDE_4_DEPTH)

    # 草图23 → 凸台-拉伸5 (add)
    with BuildSketch(Plane.XY.offset(13)):
        Polygon((-48.5, -104.768665882), (-48.5, -107.768665882), (-16.5, -107.768665882), (-16.5, -104.768665882), (-16.5, -102.768665882), (-48.5, -102.768665882), align=None)
        Polygon((16.5, -104.768665882), (16.5, -107.768665882), (48.5, -107.768665882), (48.5, -104.768665882), (48.5, -102.768665882), (16.5, -102.768665882), align=None)
    extrude(amount=EXTRUDE_5_DEPTH)

    # 草图25 → 切除-拉伸17 (cut)
    with BuildSketch(Plane(origin=(0, -102.768665882, 0), x_dir=(1, 0, 0), z_dir=(0, 1, 0))):
        with Locations((-19.5, -32.5)):
            Rectangle(SKETCH_25_W, SKETCH_25_H)
        with Locations((-45.5, -32.5)):
            Rectangle(SKETCH_25_W, SKETCH_25_H)
        with Locations((19.5, -32.5)):
            Rectangle(SKETCH_25_W, SKETCH_25_H)
        with Locations((45.5, -32.5)):
            Rectangle(SKETCH_25_W, SKETCH_25_H)
    extrude(amount=-CUT_EXTRUDE_17_DEPTH, mode=Mode.SUBTRACT)

    # 圆角3
    fillet_3_edges = [body_2_1.edges().sort_by_distance(p)[0] for p in [
        (22.5, -105.268665882, 17),
        (42.5, -105.268665882, 17),
    ]]
    fillet(fillet_3_edges, radius=FILLET_3_R - 0.0001)  # a hair under: the kernel refuses the full size

    # 圆角4
    fillet_4_edges = [body_2_1.edges().sort_by_distance(p)[0] for p in [
        (-42.5, -105.268665882, 17),
        (-22.5, -105.268665882, 17),
    ]]
    fillet(fillet_4_edges, radius=FILLET_4_R - 0.0001)  # a hair under: the kernel refuses the full size

    # 圆角5
    fillet_5_edges = [body_2_1.edges().sort_by_distance(p)[0] for p in [
        (16.5, -96.24704609, 15),
        (48.5, -96.24704609, 15),
        (48.5, -107.768665882, 15),
        (16.5, -107.768665882, 15),
    ]]
    fillet(fillet_5_edges, radius=FILLET_5_R)

    # 圆角6
    fillet_6_edges = [body_2_1.edges().sort_by_distance(p)[0] for p in [
        (-48.5, -96.24704609, 15),
        (-16.5, -96.24704609, 15),
        (-16.5, -107.768665882, 15),
        (-48.5, -107.768665882, 15),
    ]]
    fillet(fillet_6_edges, radius=FILLET_6_R)

    # 草图26 → 切除-拉伸18 (cut)
    with BuildSketch(Plane.XZ.offset(107.768665882)):
        with BuildLine():
            Line((35.9, 20.5), (35.9, 32.5))
            ThreePointArc((35.9, 32.5), (37.5, 34.1), (39.1, 32.5))
            Line((39.1, 32.5), (39.1, 20.5))
            ThreePointArc((39.1, 20.5), (37.5, 18.9), (35.9, 20.5))
        make_face()
        with BuildLine():
            Line((25.9, 20.5), (25.9, 32.5))
            ThreePointArc((25.9, 32.5), (27.5, 34.1), (29.1, 32.5))
            Line((29.1, 32.5), (29.1, 20.5))
            ThreePointArc((29.1, 20.5), (27.5, 18.9), (25.9, 20.5))
        make_face()
        with BuildLine():
            Line((-29.1, 20.5), (-29.1, 32.5))
            ThreePointArc((-29.1, 32.5), (-27.5, 34.1), (-25.9, 32.5))
            Line((-25.9, 32.5), (-25.9, 20.5))
            ThreePointArc((-25.9, 20.5), (-27.5, 18.9), (-29.1, 20.5))
        make_face()
        with BuildLine():
            Line((-39.1, 20.5), (-39.1, 32.5))
            ThreePointArc((-39.1, 32.5), (-37.5, 34.1), (-35.9, 32.5))
            Line((-35.9, 32.5), (-35.9, 20.5))
            ThreePointArc((-35.9, 20.5), (-37.5, 18.9), (-39.1, 20.5))
        make_face()
    extrude(amount=-CUT_EXTRUDE_18_DEPTH, mode=Mode.SUBTRACT)

    # 草图27 → 切除-拉伸19 (cut, two sides: drawn at the far end of the back side and taken through both)
    with BuildSketch(Plane(origin=(42.5, 0, 0), x_dir=(0, 0, -1), z_dir=(1, 0, 0)).offset(-CUT_EXTRUDE_19_DEPTH_BACK)):
        with Locations((-32.5, -103.268665882)):
            Rectangle(SKETCH_27_W, SKETCH_27_H)
    extrude(amount=CUT_EXTRUDE_19_DEPTH + CUT_EXTRUDE_19_DEPTH_BACK, mode=Mode.SUBTRACT)

    # 圆角8
    # the kernel refuses this fillet: 1 mm, written as the material it adds along each edge
    with BuildSketch(Plane(origin=(-12.2501, -103.768665882, 17), x_dir=(0, 0, 1), z_dir=(-1, 0, 0))) as fillet_8_piece_1_section:
        with BuildLine():
            CenterArc((FILLET_8_R, FILLET_8_R), FILLET_8_R, 180, 90)
            Line((0, FILLET_8_R), (0, 0))
            Line((0, 0), (FILLET_8_R, 0))
        make_face()
    fillet_8_piece_1 = extrude(amount=40.4998, mode=Mode.PRIVATE)
    fillet_8_piece_1 = split(fillet_8_piece_1, bisect_by=Plane(origin=(-16.5, -103.768665882, 17), z_dir=(-1, 0, 0)), keep=Keep.TOP, mode=Mode.PRIVATE)
    fillet_8_piece_1 = split(fillet_8_piece_1, bisect_by=Plane(origin=(-48.5, -103.768665882, 17), z_dir=(1, 0, 0)), keep=Keep.TOP, mode=Mode.PRIVATE)
    fillet_8_piece_1 = fillet_8_piece_1 - Plane(origin=(-48.4999, -103.768665882, 22.9999), x_dir=(1, 0, 0), z_dir=(0, -1, 0)) * Cylinder(5.9999, 85, mode=Mode.PRIVATE)
    fillet_8_piece_1 = fillet_8_piece_1 - Plane(origin=(-16.5001, -103.768665882, 22.9999), x_dir=(-1, 0, 0), z_dir=(0, -1, 0)) * Cylinder(5.9999, 85, mode=Mode.PRIVATE)
    add(fillet_8_piece_1)

    # 圆角9
    fillet_9_edges = [body_2_1.edges().sort_by_distance(p)[0] for p in [
        (32.5, -103.768665882, 17),
    ]]
    fillet(fillet_9_edges, radius=FILLET_9_R)

    # 圆角10
    fillet_10_edges = [body_2_1.edges().sort_by_distance(p)[0] for p in [
        (-42.5, -105.768665882, 48),
        (-22.5, -105.768665882, 48),
    ]]
    fillet(fillet_10_edges, radius=FILLET_10_R)

    # 草图28 → 切除-拉伸20 (cut)
    with BuildSketch(Plane.XZ.offset(107.768665882)):
        with Locations((0, 42.828466861)):
            Rectangle(SKETCH_28_W, SKETCH_28_H)
    extrude(amount=-CUT_EXTRUDE_20_DEPTH, mode=Mode.SUBTRACT)

    # 圆角12
    fillet_12_edges = [body_2_1.edges().sort_by_distance(p)[0] for p in [
        (22.5, -105.768665882, 37.656933722),
        (42.5, -105.768665882, 37.656933722),
    ]]
    fillet(fillet_12_edges, radius=FILLET_12_R)

    # 圆角13
    fillet_13_edges = [body_2_1.edges().sort_by_distance(p)[0] for p in [
        (-22.5, -105.768665882, 37.656933722),
        (-42.5, -105.768665882, 37.656933722),
    ]]
    fillet(fillet_13_edges, radius=FILLET_13_R)

    # 草图32 → 凸台-拉伸7 (add)
    with BuildSketch(Plane(origin=(0, 0, 13), x_dir=(-1, 0, 0), z_dir=(0, 0, -1))):
        with BuildLine():
            Line((-48.5, -97.74704609), (-46.436140662, -97.74704609))
            ThreePointArc((-46.436140662, -97.74704609), (-45.810092587, -97.195836884), (-45, -96.99704609))
            Line((-45, -96.99704609), (-36, -96.99704609))
            ThreePointArc((-36, -96.99704609), (-35.189907413, -97.195836884), (-34.563859338, -97.74704609))
            Line((-34.563859338, -97.74704609), (-30.436140662, -97.74704609))
            ThreePointArc((-30.436140662, -97.74704609), (-29.810092587, -97.195836884), (-29, -96.99704609))
            Line((-29, -96.99704609), (-20, -96.99704609))
            ThreePointArc((-20, -96.99704609), (-19.189907413, -97.195836884), (-18.563859338, -97.74704609))
            Line((-18.563859338, -97.74704609), (-16.5, -97.74704609))
            Line((-16.5, -97.74704609), (-16.5, -95.24704609))
            Line((-16.5, -95.24704609), (-48.5, -95.24704609))
            Line((-48.5, -95.24704609), (-48.5, -97.74704609))
        make_face()
        with BuildLine():
            Line((18.563859338, -97.74704609), (16.5, -97.74704609))
            Line((16.5, -97.74704609), (16.5, -95.24704609))
            Line((16.5, -95.24704609), (48.5, -95.24704609))
            Line((48.5, -95.24704609), (48.5, -97.74704609))
            Line((48.5, -97.74704609), (46.436140662, -97.74704609))
            ThreePointArc((46.436140662, -97.74704609), (45.810092587, -97.195836884), (45, -96.99704609))
            Line((45, -96.99704609), (36, -96.99704609))
            ThreePointArc((36, -96.99704609), (35.189907413, -97.195836884), (34.563859338, -97.74704609))
            Line((34.563859338, -97.74704609), (30.436140662, -97.74704609))
            ThreePointArc((30.436140662, -97.74704609), (29.810092587, -97.195836884), (29, -96.99704609))
            Line((29, -96.99704609), (20, -96.99704609))
            ThreePointArc((20, -96.99704609), (19.189907413, -97.195836884), (18.563859338, -97.74704609))
        make_face()
    extrude(amount=-EXTRUDE_7_DEPTH)

    # 圆角14
    fillet_14_edges = [body_2_1.edges().sort_by_distance(p)[0] for p in [
        (48.5, -95.24704609, 15),
        (16.5, -95.24704609, 15),
    ]]
    fillet(fillet_14_edges, radius=FILLET_14_R)

    # 圆角15
    fillet_15_edges = [body_2_1.edges().sort_by_distance(p)[0] for p in [
        (-16.5, -95.24704609, 15),
        (-48.5, -95.24704609, 15),
    ]]
    fillet(fillet_15_edges, radius=FILLET_15_R)

    # 草图33 → 切除-拉伸22 (cut)
    with BuildSketch(Plane.XZ.offset(107.768665882)):
        with Locations((-31.993209744, 26.20711721)):
            Rectangle(SKETCH_33_W, SKETCH_33_H)
    extrude(amount=-CUT_EXTRUDE_22_DEPTH, mode=Mode.SUBTRACT)

    # 草图34 → 凸台-拉伸8 (add)
    with BuildSketch(Plane.XZ.offset(107.768665882)):
        with Locations((32.5, 40.656933722)):
            Rectangle(SKETCH_34_W, SKETCH_34_H)
    extrude(amount=-EXTRUDE_8_DEPTH)

    # 草图35 → 切除-拉伸23 (cut)
    with BuildSketch(Plane.XZ.offset(107.768665882)):
        with BuildLine():
            Line((39.1, 32.5), (39.1, 42.5))
            ThreePointArc((39.1, 42.5), (37.5, 44.1), (35.9, 42.5))
            Line((35.9, 42.5), (35.9, 32.5))
            ThreePointArc((35.9, 32.5), (37.5, 30.9), (39.1, 32.5))
        make_face()
        with BuildLine():
            Line((29.1, 32.5), (29.1, 42.5))
            ThreePointArc((29.1, 42.5), (27.5, 44.1), (25.9, 42.5))
            Line((25.9, 42.5), (25.9, 32.5))
            ThreePointArc((25.9, 32.5), (27.5, 30.9), (29.1, 32.5))
        make_face()
    extrude(amount=-CUT_EXTRUDE_23_DEPTH, mode=Mode.SUBTRACT)

    # 圆角17
    fillet_17_edges = [body_2_1.edges().sort_by_distance(p)[0] for p in [
        (42.5, -105.768665882, 46.656933722),
        (22.5, -105.768665882, 46.656933722),
    ]]
    fillet(fillet_17_edges, radius=FILLET_17_R)


solid = body_2_1.part
